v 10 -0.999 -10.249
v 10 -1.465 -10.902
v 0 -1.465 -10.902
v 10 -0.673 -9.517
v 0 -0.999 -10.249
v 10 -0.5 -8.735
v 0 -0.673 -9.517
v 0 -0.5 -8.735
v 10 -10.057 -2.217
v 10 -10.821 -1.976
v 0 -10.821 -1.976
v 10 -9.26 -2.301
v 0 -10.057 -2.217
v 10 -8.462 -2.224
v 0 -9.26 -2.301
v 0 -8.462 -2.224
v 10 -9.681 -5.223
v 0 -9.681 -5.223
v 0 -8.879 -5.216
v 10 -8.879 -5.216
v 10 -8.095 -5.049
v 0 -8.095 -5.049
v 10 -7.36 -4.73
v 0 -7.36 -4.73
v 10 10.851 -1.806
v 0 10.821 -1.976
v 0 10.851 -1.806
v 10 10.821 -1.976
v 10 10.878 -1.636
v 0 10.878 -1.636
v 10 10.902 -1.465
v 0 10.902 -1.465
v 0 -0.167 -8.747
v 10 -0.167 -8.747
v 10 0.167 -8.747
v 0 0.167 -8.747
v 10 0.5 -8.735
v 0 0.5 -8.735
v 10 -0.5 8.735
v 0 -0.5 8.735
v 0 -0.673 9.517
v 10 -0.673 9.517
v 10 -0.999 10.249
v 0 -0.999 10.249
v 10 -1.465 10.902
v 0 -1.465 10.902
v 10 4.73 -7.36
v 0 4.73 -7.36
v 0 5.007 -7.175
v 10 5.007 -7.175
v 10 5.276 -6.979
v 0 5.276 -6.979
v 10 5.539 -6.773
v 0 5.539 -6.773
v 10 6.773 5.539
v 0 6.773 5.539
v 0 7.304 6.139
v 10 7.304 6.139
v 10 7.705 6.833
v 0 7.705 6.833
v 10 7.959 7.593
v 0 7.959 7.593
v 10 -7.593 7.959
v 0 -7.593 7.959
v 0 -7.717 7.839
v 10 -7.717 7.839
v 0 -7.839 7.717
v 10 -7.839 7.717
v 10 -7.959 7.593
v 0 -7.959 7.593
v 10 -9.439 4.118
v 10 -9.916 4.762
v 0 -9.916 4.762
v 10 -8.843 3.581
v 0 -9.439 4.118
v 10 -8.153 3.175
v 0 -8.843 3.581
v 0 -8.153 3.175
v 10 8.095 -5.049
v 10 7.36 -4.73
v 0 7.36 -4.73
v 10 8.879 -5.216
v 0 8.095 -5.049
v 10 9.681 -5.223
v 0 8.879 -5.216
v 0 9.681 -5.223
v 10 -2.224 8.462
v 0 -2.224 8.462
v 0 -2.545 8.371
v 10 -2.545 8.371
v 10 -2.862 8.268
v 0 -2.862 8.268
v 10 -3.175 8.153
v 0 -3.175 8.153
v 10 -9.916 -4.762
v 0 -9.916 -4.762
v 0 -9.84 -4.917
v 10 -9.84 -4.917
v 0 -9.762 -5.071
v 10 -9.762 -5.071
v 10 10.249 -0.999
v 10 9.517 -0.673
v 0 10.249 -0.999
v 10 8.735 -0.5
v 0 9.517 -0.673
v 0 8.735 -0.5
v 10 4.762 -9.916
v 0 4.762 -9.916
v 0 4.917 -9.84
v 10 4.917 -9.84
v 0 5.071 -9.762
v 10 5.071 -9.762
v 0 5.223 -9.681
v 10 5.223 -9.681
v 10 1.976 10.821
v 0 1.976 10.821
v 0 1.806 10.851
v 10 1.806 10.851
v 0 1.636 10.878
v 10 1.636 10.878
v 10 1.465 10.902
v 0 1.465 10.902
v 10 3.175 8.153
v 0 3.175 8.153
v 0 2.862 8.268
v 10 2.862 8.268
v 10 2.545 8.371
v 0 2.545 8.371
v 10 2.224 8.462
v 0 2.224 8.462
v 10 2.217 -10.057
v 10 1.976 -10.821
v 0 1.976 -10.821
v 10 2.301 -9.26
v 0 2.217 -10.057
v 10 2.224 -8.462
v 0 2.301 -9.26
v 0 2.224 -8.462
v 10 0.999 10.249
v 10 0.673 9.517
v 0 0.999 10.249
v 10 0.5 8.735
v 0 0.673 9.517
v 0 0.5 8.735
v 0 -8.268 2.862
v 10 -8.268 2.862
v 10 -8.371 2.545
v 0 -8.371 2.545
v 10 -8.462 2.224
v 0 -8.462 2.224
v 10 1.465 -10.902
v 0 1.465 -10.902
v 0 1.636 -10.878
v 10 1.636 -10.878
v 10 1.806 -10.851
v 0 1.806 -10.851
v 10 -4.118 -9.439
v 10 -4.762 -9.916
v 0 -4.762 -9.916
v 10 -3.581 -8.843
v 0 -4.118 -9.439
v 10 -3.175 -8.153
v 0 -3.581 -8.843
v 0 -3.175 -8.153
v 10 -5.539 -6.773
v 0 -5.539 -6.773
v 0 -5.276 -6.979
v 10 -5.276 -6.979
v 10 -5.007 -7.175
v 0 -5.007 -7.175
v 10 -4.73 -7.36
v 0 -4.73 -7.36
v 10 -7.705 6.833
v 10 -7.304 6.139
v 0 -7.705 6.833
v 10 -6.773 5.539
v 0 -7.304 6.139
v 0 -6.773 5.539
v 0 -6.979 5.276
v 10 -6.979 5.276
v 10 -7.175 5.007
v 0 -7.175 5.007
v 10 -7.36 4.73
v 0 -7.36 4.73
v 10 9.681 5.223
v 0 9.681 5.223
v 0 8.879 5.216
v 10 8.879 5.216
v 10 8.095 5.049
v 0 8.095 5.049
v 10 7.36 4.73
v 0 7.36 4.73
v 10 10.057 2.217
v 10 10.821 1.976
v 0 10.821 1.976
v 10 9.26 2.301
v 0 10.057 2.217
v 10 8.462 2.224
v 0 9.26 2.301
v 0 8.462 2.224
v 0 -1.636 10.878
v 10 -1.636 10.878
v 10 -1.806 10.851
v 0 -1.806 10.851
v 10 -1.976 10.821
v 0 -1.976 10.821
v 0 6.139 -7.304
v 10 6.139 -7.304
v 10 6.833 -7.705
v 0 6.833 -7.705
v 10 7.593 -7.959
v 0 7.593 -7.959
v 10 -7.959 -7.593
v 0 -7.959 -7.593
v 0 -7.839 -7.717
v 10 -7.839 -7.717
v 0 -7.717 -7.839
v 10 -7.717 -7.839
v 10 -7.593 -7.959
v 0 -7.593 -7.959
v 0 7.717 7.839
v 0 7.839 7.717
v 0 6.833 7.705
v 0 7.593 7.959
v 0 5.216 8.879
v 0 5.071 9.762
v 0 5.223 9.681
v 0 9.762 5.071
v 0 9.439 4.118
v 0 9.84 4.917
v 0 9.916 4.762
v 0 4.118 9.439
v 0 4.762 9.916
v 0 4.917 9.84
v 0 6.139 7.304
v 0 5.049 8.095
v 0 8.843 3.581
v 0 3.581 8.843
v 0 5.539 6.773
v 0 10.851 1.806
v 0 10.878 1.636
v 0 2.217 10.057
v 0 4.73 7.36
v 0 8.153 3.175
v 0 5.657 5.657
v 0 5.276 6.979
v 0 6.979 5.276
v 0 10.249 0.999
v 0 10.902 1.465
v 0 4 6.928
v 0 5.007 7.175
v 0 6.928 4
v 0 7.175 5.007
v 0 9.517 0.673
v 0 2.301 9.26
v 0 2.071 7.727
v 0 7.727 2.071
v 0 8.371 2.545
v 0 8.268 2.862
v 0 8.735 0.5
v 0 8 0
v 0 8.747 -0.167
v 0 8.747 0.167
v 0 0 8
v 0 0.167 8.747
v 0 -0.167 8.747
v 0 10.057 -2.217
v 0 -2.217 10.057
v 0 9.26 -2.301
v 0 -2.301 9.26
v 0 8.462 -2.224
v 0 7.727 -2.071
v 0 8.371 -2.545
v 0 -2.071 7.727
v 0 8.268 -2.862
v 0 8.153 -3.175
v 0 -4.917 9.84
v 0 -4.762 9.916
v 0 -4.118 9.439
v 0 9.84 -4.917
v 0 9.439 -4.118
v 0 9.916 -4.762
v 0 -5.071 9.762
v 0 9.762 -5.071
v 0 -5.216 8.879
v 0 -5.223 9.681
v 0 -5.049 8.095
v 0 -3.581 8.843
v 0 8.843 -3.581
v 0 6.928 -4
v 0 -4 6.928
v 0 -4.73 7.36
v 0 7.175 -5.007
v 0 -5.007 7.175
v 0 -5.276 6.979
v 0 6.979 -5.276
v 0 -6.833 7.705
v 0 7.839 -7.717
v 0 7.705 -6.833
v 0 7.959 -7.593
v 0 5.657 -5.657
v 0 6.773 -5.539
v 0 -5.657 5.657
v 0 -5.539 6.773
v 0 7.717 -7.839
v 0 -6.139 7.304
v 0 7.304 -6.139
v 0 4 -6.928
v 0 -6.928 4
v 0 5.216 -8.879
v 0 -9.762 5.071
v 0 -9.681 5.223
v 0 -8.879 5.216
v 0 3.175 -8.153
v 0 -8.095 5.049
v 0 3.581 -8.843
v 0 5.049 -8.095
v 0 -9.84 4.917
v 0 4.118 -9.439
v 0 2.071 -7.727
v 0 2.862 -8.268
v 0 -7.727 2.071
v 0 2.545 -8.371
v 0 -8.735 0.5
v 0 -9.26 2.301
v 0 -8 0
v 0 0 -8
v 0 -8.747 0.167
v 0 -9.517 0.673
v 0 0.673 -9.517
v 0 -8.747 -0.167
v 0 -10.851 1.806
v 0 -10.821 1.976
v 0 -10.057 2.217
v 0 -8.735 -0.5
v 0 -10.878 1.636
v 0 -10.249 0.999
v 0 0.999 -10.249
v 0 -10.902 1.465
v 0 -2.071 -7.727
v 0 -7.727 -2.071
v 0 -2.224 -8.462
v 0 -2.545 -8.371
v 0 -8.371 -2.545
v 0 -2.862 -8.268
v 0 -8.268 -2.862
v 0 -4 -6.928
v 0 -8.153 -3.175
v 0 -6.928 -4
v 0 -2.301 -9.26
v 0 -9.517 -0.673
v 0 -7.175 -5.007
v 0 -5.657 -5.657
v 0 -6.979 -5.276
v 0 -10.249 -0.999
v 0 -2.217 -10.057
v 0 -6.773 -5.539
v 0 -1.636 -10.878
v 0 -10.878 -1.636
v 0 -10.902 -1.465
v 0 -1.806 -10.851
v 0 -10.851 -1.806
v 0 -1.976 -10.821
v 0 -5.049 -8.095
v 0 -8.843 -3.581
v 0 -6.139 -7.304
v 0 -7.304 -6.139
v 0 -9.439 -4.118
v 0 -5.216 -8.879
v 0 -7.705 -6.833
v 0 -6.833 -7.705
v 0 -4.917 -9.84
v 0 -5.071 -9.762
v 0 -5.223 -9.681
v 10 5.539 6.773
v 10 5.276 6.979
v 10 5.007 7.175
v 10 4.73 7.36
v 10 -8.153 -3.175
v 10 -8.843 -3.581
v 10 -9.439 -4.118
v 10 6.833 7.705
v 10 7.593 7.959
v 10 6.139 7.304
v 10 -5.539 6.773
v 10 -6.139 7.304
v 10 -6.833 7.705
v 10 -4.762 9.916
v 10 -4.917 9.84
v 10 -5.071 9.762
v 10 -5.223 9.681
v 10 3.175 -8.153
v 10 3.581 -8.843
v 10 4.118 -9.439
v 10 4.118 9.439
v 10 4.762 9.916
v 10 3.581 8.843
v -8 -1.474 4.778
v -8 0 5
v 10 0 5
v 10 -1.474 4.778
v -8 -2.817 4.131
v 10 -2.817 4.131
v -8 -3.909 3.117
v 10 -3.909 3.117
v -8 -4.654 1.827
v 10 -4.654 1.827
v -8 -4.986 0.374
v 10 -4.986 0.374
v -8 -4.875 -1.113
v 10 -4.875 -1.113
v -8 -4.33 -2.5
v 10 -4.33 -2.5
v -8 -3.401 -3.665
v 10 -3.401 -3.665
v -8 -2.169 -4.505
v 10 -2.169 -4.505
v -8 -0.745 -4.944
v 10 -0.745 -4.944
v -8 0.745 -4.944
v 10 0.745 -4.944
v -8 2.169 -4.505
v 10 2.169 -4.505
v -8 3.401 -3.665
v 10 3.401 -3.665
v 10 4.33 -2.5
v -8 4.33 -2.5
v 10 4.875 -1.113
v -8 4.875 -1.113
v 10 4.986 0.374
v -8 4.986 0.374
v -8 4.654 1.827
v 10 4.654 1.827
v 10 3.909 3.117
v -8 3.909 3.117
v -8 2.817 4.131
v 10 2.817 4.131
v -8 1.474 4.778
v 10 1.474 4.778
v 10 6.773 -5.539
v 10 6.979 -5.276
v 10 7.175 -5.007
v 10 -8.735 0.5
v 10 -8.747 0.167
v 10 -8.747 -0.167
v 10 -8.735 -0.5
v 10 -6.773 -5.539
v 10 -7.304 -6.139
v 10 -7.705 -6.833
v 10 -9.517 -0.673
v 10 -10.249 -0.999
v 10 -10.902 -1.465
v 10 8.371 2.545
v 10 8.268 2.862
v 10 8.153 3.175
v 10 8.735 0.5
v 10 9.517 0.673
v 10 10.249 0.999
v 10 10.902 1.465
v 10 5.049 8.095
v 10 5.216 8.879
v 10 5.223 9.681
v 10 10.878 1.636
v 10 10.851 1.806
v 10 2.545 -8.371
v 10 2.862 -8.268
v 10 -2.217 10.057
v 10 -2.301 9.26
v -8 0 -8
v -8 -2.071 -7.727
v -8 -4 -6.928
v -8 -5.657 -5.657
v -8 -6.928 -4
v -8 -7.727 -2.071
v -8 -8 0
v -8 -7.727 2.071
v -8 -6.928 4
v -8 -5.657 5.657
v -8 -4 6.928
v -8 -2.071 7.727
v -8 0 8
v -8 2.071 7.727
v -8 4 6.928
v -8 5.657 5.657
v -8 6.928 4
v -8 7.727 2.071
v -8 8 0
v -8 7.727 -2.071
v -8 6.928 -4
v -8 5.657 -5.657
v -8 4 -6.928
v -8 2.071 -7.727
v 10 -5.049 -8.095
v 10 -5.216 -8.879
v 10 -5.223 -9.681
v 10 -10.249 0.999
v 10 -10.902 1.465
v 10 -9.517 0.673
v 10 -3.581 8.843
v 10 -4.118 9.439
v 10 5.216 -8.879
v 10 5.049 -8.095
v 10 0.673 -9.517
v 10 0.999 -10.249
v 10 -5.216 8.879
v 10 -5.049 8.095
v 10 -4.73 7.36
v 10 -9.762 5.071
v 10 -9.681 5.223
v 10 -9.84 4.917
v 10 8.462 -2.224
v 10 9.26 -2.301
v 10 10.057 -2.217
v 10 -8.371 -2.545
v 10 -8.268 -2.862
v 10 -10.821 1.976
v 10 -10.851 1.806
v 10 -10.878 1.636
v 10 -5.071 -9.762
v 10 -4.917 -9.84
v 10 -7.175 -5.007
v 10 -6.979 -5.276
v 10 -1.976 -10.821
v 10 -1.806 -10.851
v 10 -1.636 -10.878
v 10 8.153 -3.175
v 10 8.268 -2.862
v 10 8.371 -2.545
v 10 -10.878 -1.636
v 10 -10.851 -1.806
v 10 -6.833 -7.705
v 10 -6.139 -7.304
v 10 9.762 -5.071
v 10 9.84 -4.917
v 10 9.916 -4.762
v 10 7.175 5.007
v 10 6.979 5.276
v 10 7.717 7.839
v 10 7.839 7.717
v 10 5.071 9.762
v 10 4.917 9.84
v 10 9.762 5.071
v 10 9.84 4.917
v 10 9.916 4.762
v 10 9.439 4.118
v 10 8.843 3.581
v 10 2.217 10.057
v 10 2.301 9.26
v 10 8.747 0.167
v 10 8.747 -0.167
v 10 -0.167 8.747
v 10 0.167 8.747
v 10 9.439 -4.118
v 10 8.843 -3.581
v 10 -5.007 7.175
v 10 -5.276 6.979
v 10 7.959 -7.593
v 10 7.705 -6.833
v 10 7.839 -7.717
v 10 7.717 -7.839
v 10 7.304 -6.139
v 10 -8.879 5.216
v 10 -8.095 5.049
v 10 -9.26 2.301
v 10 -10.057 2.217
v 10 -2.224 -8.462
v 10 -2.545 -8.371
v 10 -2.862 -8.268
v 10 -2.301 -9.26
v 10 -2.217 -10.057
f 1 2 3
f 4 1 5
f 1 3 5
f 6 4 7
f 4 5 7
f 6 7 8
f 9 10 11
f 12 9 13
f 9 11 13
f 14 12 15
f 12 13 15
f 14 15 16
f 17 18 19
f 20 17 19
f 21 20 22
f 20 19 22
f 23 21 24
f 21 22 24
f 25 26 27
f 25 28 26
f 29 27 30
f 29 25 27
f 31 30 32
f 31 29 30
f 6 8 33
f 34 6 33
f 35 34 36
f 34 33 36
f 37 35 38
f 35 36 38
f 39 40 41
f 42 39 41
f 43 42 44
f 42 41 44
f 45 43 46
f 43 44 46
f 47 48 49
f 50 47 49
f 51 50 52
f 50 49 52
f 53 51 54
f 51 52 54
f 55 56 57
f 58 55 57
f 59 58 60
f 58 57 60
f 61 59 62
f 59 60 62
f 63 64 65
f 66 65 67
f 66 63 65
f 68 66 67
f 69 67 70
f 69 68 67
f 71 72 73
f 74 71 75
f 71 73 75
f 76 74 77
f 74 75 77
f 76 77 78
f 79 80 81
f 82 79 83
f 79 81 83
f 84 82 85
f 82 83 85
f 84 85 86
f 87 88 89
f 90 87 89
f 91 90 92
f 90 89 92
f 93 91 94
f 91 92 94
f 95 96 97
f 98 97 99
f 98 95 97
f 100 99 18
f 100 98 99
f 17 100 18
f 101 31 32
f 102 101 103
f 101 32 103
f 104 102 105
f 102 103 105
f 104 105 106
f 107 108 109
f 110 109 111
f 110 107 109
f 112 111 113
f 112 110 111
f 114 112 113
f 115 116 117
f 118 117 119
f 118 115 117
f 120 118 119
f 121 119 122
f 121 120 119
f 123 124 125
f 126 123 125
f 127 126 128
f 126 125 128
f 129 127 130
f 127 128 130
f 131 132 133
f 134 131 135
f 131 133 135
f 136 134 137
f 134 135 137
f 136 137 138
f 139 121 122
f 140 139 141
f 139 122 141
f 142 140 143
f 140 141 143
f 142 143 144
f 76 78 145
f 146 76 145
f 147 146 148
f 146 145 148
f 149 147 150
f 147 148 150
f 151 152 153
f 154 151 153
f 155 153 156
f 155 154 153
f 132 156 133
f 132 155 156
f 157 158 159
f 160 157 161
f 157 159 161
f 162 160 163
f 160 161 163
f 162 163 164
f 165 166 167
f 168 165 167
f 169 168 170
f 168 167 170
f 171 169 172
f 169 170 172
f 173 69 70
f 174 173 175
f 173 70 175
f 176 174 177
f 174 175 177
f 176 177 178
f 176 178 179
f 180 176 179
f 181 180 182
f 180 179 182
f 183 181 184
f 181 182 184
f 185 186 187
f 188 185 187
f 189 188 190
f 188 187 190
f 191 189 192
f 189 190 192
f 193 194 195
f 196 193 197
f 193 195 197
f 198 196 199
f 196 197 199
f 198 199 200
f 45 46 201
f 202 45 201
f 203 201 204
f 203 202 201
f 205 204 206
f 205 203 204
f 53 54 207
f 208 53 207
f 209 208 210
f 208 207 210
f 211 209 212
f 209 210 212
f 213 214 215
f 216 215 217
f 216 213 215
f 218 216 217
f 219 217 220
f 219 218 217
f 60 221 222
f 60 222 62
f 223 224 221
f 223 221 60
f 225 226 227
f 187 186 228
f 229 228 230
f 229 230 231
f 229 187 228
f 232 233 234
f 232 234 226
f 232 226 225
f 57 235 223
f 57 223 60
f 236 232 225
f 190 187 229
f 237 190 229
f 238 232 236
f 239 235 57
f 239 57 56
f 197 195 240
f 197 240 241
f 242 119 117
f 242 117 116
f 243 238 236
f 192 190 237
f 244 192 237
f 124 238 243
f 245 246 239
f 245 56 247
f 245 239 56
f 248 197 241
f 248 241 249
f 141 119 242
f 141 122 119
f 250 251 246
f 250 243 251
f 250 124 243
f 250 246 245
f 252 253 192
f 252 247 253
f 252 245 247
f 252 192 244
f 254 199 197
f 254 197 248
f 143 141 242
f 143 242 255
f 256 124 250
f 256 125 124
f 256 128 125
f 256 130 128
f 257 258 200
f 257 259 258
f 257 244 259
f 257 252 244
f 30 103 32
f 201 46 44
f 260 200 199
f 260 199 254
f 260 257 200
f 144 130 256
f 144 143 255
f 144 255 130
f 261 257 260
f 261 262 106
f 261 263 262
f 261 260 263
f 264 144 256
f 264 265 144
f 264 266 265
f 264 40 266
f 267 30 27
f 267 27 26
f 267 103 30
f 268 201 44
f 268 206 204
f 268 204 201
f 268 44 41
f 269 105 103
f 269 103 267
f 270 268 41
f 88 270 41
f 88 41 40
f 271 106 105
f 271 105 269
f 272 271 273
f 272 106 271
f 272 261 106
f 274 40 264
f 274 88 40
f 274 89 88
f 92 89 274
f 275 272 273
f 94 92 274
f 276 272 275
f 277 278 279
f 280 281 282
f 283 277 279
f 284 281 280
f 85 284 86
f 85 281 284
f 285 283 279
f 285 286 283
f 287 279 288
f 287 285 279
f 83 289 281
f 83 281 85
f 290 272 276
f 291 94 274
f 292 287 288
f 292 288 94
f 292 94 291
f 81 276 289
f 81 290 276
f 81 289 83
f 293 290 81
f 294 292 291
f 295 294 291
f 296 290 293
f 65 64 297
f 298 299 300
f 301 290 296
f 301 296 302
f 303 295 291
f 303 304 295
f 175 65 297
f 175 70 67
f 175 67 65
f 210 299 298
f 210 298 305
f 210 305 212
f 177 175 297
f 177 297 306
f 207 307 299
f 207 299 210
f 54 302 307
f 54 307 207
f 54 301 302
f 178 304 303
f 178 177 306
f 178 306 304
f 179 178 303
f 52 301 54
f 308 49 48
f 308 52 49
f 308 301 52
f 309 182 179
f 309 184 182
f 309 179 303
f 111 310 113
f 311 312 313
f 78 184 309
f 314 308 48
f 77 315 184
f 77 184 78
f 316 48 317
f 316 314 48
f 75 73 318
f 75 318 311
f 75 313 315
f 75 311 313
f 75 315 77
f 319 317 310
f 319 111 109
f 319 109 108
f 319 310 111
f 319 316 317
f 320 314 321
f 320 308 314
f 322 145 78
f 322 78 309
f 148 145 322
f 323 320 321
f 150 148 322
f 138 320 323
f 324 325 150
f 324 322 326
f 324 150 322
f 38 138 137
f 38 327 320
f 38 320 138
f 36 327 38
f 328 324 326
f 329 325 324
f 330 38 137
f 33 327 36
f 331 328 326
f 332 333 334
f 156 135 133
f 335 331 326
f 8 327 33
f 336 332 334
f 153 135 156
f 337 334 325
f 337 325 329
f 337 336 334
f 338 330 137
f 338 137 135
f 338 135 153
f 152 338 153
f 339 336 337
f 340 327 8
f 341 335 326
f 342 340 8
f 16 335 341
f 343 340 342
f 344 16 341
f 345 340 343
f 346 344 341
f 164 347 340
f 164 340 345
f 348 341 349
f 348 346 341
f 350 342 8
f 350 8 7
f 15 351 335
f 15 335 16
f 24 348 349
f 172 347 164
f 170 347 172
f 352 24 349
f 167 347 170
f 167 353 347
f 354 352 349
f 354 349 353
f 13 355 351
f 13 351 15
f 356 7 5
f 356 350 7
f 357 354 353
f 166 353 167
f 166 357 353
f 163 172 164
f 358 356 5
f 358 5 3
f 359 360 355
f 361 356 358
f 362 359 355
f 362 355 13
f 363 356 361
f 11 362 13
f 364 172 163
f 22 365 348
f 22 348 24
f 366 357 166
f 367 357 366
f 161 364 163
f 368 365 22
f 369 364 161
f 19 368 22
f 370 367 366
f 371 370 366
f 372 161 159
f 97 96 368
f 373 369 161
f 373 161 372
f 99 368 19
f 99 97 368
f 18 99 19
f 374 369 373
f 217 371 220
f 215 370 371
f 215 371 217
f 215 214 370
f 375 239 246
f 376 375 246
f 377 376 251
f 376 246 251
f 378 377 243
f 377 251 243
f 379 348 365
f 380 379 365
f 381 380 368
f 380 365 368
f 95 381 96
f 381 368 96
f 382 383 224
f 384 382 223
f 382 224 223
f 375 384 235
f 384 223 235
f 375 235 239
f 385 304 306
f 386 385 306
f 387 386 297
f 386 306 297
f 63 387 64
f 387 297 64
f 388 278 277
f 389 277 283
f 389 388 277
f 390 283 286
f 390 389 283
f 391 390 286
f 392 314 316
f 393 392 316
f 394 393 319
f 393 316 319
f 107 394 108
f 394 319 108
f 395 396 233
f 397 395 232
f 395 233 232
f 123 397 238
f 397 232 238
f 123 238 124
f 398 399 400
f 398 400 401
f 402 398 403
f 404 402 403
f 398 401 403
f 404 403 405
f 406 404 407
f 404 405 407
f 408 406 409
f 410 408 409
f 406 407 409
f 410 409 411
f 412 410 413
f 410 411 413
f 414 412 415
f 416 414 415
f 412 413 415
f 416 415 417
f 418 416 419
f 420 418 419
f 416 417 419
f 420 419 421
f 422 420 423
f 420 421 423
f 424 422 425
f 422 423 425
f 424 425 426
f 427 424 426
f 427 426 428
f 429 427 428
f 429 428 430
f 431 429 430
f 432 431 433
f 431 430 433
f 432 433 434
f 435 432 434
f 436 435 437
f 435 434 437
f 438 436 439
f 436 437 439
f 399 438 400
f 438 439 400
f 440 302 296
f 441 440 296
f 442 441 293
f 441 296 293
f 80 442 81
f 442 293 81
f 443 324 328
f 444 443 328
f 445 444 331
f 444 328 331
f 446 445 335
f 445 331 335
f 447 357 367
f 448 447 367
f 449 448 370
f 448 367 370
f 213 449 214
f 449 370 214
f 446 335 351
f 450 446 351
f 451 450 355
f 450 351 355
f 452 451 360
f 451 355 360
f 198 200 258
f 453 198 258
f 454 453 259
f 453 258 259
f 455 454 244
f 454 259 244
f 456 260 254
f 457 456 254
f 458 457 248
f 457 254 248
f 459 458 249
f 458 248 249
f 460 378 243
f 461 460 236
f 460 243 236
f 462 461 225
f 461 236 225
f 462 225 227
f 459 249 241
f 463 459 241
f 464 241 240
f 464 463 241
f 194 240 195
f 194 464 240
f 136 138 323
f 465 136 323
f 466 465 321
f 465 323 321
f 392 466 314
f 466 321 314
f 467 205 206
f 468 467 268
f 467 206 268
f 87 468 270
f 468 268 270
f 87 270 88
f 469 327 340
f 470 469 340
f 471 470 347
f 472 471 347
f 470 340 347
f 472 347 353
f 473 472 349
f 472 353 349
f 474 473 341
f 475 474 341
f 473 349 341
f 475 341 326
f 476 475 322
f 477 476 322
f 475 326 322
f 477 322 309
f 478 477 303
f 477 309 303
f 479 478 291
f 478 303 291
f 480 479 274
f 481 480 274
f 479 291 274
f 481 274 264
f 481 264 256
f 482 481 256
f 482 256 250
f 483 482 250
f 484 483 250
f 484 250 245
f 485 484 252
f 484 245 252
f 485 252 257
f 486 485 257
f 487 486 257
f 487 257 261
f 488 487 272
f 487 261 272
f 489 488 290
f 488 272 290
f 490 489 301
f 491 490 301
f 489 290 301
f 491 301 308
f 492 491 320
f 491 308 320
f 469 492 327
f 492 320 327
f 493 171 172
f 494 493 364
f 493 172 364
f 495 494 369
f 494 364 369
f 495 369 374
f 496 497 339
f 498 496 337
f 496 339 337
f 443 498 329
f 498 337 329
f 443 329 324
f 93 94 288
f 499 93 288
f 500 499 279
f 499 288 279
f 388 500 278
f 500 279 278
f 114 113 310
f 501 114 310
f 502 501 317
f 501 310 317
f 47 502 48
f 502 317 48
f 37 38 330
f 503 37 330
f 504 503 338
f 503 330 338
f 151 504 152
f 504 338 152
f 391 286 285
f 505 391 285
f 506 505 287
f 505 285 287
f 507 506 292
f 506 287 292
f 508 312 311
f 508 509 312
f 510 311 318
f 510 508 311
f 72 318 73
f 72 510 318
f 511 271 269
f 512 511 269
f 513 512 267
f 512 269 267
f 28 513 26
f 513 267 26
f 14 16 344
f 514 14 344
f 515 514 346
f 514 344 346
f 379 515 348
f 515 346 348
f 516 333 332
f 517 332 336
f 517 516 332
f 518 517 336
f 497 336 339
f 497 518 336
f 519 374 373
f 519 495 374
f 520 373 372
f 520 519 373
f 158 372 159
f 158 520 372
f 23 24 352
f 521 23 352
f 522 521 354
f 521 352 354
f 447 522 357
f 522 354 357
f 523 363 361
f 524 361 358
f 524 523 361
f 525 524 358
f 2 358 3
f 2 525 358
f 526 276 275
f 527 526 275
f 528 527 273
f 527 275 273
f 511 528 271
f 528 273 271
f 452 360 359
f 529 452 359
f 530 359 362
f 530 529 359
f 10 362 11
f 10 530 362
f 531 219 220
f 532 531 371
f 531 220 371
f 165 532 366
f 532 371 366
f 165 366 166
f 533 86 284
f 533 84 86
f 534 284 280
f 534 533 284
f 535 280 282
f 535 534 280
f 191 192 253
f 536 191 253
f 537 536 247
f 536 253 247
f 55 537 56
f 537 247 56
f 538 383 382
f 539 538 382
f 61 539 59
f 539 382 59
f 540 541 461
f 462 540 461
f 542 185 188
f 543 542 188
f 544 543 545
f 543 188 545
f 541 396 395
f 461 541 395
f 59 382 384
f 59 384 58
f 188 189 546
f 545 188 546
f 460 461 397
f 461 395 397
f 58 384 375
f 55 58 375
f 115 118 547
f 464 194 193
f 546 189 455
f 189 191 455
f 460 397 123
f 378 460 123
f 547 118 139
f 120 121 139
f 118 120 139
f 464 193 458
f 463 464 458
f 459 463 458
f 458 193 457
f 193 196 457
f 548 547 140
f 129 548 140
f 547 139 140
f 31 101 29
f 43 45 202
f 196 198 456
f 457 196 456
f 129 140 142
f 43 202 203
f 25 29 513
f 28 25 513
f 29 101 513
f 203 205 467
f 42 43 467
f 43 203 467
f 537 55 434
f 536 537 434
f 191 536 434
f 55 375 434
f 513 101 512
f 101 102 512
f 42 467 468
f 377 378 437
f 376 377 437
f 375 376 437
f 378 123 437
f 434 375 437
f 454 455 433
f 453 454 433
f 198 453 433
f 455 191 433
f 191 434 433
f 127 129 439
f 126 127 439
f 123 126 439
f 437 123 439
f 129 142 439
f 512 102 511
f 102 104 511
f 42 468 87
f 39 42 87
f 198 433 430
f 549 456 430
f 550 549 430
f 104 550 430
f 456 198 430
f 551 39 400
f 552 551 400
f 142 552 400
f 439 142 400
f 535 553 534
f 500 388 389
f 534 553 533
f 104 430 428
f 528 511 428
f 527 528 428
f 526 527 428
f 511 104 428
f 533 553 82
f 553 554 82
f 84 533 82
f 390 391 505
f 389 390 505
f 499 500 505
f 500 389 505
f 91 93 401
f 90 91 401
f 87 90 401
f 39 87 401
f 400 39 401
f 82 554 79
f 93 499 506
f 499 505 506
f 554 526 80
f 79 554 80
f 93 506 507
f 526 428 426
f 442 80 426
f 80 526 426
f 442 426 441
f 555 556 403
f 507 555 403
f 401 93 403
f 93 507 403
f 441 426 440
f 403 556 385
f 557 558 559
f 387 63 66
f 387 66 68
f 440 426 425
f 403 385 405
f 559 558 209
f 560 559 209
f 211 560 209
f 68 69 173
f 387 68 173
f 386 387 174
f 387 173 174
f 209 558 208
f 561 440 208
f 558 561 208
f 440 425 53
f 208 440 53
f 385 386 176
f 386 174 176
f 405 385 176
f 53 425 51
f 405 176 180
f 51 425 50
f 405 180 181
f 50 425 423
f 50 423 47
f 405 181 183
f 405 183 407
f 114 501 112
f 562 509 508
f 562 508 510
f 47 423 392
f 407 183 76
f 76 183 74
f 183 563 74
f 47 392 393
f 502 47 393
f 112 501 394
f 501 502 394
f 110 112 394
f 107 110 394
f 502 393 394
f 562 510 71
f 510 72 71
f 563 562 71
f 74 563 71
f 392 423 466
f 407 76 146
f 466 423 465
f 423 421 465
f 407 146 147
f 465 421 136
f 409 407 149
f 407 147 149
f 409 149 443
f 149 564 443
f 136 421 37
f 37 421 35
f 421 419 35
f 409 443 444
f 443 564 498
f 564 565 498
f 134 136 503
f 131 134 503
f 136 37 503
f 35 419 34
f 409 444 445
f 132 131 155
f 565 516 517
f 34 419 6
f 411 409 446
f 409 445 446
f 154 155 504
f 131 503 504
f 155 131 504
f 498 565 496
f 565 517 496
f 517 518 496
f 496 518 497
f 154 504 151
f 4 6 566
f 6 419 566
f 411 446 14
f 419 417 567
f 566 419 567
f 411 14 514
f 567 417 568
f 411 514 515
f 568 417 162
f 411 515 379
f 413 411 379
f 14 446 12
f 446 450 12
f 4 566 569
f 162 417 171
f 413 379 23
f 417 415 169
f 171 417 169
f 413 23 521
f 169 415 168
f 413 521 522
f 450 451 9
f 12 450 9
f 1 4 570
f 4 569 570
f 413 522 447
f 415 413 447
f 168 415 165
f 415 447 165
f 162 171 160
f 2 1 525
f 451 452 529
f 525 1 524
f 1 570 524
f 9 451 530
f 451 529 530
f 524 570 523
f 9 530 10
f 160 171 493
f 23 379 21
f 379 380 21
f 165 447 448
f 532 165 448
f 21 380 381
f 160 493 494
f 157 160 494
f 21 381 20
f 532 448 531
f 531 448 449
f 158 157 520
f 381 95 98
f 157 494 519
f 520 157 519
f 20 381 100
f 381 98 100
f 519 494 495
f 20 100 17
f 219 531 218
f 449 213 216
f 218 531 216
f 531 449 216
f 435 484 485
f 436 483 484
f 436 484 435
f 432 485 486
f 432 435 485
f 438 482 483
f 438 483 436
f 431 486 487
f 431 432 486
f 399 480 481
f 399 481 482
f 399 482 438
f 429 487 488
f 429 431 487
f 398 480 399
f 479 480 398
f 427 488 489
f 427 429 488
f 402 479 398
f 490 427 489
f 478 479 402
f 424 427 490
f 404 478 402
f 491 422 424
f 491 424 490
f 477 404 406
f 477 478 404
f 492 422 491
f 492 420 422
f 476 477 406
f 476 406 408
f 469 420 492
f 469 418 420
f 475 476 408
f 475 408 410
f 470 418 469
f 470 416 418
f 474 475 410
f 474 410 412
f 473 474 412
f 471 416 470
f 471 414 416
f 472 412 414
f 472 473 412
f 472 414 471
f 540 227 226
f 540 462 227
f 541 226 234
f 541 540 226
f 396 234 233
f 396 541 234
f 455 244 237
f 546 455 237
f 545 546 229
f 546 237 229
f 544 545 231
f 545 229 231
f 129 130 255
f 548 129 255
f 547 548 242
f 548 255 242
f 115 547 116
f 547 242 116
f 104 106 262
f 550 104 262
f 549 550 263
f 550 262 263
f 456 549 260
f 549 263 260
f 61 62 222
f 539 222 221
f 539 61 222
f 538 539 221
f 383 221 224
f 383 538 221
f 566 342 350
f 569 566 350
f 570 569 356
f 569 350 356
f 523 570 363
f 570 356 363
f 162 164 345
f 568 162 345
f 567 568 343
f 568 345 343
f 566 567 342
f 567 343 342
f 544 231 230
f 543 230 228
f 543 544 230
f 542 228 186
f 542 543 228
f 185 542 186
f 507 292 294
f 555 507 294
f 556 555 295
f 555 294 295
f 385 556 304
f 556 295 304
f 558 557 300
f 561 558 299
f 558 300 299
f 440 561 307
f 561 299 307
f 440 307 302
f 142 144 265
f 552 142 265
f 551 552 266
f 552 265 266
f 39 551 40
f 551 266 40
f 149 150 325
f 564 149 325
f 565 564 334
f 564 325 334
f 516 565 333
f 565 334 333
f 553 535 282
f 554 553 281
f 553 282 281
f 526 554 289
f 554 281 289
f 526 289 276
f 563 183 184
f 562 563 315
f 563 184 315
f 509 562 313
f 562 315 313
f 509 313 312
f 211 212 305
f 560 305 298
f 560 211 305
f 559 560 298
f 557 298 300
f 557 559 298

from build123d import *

# Parameters (mm, degrees)
BASPROSKE_W      = 10
BASPROSKE_H      = 11
TOOTHCUT_DEPTH   = 19.493242009
TEETHCUTS_COUNT  = 20
TEETHCUTS_ANGLE  = 342
HUBNEAONESKE_R   = 8
HUBNEARONE_DEPTH = 8.0000508
BORSKE_R         = 5
BORE_DEPTH       = 18.0000508


with BuildPart() as part:
    # BasProSke → Base-Revolve (revolve)
    with BuildSketch(Plane(origin=(0, 0, 0), x_dir=(1, 0, 0), z_dir=(0, 1, 0)), mode=Mode.PRIVATE) as base_revolve_sk:
        with Locations((5, 5.5)):
            Rectangle(BASPROSKE_W, BASPROSKE_H)
    revolve(base_revolve_sk.sketch.rotate(Axis((-10, 0, 0), (1, 0, 0)), 180), axis=Axis((-10, 0, 0), (1, 0, 0)))

    # TooCutSke → ToothCut (cut, through all)
    with BuildSketch(Plane(origin=(0, 0, 0), x_dir=(0, 0, -1), z_dir=(1, 0, 0))):
        with BuildLine():
            ThreePointArc((0.499924007, 8.734705318), (0, 8.749), (-0.499924007, 8.734705318))
            ThreePointArc((-0.499924007, 8.734705318), (-0.824302243, 9.905497836), (-1.485192705, 10.924909509))
            ThreePointArc((-1.485192705, 10.924909509), (0, 11.0254), (1.485192705, 10.924909509))
            ThreePointArc((1.485192705, 10.924909509), (0.824302243, 9.905497836), (0.499924007, 8.734705318))
        make_face()
    toothcut = extrude(amount=TOOTHCUT_DEPTH, mode=Mode.SUBTRACT)

    # TeethCuts: ToothCut ×20 about axis
    teethcuts_axis = Axis((-10, 0, 0), (1, 0, 0))
    for i in range(1, TEETHCUTS_COUNT):
        add(toothcut.rotate(teethcuts_axis, i * TEETHCUTS_ANGLE / (TEETHCUTS_COUNT - 1)), mode=Mode.SUBTRACT)

    # HubNeaOneSke → HubNearOne (add)
    with BuildSketch(Plane.ZY):
        with Locations(Location((0, 0, 0), (0, 0, 180))):
            Circle(HUBNEAONESKE_R)
    extrude(amount=HUBNEARONE_DEPTH)

    # BorSke → Bore (cut, symmetric)
    with BuildSketch(Plane(origin=(0, 0, 0), x_dir=(0, 0, -1), z_dir=(1, 0, 0))):
        with Locations(Location((0, 0, 0), (0, 0, 180))):
            Circle(BORSKE_R)
    extrude(amount=BORE_DEPTH, both=True, mode=Mode.SUBTRACT)


solid = part.part
